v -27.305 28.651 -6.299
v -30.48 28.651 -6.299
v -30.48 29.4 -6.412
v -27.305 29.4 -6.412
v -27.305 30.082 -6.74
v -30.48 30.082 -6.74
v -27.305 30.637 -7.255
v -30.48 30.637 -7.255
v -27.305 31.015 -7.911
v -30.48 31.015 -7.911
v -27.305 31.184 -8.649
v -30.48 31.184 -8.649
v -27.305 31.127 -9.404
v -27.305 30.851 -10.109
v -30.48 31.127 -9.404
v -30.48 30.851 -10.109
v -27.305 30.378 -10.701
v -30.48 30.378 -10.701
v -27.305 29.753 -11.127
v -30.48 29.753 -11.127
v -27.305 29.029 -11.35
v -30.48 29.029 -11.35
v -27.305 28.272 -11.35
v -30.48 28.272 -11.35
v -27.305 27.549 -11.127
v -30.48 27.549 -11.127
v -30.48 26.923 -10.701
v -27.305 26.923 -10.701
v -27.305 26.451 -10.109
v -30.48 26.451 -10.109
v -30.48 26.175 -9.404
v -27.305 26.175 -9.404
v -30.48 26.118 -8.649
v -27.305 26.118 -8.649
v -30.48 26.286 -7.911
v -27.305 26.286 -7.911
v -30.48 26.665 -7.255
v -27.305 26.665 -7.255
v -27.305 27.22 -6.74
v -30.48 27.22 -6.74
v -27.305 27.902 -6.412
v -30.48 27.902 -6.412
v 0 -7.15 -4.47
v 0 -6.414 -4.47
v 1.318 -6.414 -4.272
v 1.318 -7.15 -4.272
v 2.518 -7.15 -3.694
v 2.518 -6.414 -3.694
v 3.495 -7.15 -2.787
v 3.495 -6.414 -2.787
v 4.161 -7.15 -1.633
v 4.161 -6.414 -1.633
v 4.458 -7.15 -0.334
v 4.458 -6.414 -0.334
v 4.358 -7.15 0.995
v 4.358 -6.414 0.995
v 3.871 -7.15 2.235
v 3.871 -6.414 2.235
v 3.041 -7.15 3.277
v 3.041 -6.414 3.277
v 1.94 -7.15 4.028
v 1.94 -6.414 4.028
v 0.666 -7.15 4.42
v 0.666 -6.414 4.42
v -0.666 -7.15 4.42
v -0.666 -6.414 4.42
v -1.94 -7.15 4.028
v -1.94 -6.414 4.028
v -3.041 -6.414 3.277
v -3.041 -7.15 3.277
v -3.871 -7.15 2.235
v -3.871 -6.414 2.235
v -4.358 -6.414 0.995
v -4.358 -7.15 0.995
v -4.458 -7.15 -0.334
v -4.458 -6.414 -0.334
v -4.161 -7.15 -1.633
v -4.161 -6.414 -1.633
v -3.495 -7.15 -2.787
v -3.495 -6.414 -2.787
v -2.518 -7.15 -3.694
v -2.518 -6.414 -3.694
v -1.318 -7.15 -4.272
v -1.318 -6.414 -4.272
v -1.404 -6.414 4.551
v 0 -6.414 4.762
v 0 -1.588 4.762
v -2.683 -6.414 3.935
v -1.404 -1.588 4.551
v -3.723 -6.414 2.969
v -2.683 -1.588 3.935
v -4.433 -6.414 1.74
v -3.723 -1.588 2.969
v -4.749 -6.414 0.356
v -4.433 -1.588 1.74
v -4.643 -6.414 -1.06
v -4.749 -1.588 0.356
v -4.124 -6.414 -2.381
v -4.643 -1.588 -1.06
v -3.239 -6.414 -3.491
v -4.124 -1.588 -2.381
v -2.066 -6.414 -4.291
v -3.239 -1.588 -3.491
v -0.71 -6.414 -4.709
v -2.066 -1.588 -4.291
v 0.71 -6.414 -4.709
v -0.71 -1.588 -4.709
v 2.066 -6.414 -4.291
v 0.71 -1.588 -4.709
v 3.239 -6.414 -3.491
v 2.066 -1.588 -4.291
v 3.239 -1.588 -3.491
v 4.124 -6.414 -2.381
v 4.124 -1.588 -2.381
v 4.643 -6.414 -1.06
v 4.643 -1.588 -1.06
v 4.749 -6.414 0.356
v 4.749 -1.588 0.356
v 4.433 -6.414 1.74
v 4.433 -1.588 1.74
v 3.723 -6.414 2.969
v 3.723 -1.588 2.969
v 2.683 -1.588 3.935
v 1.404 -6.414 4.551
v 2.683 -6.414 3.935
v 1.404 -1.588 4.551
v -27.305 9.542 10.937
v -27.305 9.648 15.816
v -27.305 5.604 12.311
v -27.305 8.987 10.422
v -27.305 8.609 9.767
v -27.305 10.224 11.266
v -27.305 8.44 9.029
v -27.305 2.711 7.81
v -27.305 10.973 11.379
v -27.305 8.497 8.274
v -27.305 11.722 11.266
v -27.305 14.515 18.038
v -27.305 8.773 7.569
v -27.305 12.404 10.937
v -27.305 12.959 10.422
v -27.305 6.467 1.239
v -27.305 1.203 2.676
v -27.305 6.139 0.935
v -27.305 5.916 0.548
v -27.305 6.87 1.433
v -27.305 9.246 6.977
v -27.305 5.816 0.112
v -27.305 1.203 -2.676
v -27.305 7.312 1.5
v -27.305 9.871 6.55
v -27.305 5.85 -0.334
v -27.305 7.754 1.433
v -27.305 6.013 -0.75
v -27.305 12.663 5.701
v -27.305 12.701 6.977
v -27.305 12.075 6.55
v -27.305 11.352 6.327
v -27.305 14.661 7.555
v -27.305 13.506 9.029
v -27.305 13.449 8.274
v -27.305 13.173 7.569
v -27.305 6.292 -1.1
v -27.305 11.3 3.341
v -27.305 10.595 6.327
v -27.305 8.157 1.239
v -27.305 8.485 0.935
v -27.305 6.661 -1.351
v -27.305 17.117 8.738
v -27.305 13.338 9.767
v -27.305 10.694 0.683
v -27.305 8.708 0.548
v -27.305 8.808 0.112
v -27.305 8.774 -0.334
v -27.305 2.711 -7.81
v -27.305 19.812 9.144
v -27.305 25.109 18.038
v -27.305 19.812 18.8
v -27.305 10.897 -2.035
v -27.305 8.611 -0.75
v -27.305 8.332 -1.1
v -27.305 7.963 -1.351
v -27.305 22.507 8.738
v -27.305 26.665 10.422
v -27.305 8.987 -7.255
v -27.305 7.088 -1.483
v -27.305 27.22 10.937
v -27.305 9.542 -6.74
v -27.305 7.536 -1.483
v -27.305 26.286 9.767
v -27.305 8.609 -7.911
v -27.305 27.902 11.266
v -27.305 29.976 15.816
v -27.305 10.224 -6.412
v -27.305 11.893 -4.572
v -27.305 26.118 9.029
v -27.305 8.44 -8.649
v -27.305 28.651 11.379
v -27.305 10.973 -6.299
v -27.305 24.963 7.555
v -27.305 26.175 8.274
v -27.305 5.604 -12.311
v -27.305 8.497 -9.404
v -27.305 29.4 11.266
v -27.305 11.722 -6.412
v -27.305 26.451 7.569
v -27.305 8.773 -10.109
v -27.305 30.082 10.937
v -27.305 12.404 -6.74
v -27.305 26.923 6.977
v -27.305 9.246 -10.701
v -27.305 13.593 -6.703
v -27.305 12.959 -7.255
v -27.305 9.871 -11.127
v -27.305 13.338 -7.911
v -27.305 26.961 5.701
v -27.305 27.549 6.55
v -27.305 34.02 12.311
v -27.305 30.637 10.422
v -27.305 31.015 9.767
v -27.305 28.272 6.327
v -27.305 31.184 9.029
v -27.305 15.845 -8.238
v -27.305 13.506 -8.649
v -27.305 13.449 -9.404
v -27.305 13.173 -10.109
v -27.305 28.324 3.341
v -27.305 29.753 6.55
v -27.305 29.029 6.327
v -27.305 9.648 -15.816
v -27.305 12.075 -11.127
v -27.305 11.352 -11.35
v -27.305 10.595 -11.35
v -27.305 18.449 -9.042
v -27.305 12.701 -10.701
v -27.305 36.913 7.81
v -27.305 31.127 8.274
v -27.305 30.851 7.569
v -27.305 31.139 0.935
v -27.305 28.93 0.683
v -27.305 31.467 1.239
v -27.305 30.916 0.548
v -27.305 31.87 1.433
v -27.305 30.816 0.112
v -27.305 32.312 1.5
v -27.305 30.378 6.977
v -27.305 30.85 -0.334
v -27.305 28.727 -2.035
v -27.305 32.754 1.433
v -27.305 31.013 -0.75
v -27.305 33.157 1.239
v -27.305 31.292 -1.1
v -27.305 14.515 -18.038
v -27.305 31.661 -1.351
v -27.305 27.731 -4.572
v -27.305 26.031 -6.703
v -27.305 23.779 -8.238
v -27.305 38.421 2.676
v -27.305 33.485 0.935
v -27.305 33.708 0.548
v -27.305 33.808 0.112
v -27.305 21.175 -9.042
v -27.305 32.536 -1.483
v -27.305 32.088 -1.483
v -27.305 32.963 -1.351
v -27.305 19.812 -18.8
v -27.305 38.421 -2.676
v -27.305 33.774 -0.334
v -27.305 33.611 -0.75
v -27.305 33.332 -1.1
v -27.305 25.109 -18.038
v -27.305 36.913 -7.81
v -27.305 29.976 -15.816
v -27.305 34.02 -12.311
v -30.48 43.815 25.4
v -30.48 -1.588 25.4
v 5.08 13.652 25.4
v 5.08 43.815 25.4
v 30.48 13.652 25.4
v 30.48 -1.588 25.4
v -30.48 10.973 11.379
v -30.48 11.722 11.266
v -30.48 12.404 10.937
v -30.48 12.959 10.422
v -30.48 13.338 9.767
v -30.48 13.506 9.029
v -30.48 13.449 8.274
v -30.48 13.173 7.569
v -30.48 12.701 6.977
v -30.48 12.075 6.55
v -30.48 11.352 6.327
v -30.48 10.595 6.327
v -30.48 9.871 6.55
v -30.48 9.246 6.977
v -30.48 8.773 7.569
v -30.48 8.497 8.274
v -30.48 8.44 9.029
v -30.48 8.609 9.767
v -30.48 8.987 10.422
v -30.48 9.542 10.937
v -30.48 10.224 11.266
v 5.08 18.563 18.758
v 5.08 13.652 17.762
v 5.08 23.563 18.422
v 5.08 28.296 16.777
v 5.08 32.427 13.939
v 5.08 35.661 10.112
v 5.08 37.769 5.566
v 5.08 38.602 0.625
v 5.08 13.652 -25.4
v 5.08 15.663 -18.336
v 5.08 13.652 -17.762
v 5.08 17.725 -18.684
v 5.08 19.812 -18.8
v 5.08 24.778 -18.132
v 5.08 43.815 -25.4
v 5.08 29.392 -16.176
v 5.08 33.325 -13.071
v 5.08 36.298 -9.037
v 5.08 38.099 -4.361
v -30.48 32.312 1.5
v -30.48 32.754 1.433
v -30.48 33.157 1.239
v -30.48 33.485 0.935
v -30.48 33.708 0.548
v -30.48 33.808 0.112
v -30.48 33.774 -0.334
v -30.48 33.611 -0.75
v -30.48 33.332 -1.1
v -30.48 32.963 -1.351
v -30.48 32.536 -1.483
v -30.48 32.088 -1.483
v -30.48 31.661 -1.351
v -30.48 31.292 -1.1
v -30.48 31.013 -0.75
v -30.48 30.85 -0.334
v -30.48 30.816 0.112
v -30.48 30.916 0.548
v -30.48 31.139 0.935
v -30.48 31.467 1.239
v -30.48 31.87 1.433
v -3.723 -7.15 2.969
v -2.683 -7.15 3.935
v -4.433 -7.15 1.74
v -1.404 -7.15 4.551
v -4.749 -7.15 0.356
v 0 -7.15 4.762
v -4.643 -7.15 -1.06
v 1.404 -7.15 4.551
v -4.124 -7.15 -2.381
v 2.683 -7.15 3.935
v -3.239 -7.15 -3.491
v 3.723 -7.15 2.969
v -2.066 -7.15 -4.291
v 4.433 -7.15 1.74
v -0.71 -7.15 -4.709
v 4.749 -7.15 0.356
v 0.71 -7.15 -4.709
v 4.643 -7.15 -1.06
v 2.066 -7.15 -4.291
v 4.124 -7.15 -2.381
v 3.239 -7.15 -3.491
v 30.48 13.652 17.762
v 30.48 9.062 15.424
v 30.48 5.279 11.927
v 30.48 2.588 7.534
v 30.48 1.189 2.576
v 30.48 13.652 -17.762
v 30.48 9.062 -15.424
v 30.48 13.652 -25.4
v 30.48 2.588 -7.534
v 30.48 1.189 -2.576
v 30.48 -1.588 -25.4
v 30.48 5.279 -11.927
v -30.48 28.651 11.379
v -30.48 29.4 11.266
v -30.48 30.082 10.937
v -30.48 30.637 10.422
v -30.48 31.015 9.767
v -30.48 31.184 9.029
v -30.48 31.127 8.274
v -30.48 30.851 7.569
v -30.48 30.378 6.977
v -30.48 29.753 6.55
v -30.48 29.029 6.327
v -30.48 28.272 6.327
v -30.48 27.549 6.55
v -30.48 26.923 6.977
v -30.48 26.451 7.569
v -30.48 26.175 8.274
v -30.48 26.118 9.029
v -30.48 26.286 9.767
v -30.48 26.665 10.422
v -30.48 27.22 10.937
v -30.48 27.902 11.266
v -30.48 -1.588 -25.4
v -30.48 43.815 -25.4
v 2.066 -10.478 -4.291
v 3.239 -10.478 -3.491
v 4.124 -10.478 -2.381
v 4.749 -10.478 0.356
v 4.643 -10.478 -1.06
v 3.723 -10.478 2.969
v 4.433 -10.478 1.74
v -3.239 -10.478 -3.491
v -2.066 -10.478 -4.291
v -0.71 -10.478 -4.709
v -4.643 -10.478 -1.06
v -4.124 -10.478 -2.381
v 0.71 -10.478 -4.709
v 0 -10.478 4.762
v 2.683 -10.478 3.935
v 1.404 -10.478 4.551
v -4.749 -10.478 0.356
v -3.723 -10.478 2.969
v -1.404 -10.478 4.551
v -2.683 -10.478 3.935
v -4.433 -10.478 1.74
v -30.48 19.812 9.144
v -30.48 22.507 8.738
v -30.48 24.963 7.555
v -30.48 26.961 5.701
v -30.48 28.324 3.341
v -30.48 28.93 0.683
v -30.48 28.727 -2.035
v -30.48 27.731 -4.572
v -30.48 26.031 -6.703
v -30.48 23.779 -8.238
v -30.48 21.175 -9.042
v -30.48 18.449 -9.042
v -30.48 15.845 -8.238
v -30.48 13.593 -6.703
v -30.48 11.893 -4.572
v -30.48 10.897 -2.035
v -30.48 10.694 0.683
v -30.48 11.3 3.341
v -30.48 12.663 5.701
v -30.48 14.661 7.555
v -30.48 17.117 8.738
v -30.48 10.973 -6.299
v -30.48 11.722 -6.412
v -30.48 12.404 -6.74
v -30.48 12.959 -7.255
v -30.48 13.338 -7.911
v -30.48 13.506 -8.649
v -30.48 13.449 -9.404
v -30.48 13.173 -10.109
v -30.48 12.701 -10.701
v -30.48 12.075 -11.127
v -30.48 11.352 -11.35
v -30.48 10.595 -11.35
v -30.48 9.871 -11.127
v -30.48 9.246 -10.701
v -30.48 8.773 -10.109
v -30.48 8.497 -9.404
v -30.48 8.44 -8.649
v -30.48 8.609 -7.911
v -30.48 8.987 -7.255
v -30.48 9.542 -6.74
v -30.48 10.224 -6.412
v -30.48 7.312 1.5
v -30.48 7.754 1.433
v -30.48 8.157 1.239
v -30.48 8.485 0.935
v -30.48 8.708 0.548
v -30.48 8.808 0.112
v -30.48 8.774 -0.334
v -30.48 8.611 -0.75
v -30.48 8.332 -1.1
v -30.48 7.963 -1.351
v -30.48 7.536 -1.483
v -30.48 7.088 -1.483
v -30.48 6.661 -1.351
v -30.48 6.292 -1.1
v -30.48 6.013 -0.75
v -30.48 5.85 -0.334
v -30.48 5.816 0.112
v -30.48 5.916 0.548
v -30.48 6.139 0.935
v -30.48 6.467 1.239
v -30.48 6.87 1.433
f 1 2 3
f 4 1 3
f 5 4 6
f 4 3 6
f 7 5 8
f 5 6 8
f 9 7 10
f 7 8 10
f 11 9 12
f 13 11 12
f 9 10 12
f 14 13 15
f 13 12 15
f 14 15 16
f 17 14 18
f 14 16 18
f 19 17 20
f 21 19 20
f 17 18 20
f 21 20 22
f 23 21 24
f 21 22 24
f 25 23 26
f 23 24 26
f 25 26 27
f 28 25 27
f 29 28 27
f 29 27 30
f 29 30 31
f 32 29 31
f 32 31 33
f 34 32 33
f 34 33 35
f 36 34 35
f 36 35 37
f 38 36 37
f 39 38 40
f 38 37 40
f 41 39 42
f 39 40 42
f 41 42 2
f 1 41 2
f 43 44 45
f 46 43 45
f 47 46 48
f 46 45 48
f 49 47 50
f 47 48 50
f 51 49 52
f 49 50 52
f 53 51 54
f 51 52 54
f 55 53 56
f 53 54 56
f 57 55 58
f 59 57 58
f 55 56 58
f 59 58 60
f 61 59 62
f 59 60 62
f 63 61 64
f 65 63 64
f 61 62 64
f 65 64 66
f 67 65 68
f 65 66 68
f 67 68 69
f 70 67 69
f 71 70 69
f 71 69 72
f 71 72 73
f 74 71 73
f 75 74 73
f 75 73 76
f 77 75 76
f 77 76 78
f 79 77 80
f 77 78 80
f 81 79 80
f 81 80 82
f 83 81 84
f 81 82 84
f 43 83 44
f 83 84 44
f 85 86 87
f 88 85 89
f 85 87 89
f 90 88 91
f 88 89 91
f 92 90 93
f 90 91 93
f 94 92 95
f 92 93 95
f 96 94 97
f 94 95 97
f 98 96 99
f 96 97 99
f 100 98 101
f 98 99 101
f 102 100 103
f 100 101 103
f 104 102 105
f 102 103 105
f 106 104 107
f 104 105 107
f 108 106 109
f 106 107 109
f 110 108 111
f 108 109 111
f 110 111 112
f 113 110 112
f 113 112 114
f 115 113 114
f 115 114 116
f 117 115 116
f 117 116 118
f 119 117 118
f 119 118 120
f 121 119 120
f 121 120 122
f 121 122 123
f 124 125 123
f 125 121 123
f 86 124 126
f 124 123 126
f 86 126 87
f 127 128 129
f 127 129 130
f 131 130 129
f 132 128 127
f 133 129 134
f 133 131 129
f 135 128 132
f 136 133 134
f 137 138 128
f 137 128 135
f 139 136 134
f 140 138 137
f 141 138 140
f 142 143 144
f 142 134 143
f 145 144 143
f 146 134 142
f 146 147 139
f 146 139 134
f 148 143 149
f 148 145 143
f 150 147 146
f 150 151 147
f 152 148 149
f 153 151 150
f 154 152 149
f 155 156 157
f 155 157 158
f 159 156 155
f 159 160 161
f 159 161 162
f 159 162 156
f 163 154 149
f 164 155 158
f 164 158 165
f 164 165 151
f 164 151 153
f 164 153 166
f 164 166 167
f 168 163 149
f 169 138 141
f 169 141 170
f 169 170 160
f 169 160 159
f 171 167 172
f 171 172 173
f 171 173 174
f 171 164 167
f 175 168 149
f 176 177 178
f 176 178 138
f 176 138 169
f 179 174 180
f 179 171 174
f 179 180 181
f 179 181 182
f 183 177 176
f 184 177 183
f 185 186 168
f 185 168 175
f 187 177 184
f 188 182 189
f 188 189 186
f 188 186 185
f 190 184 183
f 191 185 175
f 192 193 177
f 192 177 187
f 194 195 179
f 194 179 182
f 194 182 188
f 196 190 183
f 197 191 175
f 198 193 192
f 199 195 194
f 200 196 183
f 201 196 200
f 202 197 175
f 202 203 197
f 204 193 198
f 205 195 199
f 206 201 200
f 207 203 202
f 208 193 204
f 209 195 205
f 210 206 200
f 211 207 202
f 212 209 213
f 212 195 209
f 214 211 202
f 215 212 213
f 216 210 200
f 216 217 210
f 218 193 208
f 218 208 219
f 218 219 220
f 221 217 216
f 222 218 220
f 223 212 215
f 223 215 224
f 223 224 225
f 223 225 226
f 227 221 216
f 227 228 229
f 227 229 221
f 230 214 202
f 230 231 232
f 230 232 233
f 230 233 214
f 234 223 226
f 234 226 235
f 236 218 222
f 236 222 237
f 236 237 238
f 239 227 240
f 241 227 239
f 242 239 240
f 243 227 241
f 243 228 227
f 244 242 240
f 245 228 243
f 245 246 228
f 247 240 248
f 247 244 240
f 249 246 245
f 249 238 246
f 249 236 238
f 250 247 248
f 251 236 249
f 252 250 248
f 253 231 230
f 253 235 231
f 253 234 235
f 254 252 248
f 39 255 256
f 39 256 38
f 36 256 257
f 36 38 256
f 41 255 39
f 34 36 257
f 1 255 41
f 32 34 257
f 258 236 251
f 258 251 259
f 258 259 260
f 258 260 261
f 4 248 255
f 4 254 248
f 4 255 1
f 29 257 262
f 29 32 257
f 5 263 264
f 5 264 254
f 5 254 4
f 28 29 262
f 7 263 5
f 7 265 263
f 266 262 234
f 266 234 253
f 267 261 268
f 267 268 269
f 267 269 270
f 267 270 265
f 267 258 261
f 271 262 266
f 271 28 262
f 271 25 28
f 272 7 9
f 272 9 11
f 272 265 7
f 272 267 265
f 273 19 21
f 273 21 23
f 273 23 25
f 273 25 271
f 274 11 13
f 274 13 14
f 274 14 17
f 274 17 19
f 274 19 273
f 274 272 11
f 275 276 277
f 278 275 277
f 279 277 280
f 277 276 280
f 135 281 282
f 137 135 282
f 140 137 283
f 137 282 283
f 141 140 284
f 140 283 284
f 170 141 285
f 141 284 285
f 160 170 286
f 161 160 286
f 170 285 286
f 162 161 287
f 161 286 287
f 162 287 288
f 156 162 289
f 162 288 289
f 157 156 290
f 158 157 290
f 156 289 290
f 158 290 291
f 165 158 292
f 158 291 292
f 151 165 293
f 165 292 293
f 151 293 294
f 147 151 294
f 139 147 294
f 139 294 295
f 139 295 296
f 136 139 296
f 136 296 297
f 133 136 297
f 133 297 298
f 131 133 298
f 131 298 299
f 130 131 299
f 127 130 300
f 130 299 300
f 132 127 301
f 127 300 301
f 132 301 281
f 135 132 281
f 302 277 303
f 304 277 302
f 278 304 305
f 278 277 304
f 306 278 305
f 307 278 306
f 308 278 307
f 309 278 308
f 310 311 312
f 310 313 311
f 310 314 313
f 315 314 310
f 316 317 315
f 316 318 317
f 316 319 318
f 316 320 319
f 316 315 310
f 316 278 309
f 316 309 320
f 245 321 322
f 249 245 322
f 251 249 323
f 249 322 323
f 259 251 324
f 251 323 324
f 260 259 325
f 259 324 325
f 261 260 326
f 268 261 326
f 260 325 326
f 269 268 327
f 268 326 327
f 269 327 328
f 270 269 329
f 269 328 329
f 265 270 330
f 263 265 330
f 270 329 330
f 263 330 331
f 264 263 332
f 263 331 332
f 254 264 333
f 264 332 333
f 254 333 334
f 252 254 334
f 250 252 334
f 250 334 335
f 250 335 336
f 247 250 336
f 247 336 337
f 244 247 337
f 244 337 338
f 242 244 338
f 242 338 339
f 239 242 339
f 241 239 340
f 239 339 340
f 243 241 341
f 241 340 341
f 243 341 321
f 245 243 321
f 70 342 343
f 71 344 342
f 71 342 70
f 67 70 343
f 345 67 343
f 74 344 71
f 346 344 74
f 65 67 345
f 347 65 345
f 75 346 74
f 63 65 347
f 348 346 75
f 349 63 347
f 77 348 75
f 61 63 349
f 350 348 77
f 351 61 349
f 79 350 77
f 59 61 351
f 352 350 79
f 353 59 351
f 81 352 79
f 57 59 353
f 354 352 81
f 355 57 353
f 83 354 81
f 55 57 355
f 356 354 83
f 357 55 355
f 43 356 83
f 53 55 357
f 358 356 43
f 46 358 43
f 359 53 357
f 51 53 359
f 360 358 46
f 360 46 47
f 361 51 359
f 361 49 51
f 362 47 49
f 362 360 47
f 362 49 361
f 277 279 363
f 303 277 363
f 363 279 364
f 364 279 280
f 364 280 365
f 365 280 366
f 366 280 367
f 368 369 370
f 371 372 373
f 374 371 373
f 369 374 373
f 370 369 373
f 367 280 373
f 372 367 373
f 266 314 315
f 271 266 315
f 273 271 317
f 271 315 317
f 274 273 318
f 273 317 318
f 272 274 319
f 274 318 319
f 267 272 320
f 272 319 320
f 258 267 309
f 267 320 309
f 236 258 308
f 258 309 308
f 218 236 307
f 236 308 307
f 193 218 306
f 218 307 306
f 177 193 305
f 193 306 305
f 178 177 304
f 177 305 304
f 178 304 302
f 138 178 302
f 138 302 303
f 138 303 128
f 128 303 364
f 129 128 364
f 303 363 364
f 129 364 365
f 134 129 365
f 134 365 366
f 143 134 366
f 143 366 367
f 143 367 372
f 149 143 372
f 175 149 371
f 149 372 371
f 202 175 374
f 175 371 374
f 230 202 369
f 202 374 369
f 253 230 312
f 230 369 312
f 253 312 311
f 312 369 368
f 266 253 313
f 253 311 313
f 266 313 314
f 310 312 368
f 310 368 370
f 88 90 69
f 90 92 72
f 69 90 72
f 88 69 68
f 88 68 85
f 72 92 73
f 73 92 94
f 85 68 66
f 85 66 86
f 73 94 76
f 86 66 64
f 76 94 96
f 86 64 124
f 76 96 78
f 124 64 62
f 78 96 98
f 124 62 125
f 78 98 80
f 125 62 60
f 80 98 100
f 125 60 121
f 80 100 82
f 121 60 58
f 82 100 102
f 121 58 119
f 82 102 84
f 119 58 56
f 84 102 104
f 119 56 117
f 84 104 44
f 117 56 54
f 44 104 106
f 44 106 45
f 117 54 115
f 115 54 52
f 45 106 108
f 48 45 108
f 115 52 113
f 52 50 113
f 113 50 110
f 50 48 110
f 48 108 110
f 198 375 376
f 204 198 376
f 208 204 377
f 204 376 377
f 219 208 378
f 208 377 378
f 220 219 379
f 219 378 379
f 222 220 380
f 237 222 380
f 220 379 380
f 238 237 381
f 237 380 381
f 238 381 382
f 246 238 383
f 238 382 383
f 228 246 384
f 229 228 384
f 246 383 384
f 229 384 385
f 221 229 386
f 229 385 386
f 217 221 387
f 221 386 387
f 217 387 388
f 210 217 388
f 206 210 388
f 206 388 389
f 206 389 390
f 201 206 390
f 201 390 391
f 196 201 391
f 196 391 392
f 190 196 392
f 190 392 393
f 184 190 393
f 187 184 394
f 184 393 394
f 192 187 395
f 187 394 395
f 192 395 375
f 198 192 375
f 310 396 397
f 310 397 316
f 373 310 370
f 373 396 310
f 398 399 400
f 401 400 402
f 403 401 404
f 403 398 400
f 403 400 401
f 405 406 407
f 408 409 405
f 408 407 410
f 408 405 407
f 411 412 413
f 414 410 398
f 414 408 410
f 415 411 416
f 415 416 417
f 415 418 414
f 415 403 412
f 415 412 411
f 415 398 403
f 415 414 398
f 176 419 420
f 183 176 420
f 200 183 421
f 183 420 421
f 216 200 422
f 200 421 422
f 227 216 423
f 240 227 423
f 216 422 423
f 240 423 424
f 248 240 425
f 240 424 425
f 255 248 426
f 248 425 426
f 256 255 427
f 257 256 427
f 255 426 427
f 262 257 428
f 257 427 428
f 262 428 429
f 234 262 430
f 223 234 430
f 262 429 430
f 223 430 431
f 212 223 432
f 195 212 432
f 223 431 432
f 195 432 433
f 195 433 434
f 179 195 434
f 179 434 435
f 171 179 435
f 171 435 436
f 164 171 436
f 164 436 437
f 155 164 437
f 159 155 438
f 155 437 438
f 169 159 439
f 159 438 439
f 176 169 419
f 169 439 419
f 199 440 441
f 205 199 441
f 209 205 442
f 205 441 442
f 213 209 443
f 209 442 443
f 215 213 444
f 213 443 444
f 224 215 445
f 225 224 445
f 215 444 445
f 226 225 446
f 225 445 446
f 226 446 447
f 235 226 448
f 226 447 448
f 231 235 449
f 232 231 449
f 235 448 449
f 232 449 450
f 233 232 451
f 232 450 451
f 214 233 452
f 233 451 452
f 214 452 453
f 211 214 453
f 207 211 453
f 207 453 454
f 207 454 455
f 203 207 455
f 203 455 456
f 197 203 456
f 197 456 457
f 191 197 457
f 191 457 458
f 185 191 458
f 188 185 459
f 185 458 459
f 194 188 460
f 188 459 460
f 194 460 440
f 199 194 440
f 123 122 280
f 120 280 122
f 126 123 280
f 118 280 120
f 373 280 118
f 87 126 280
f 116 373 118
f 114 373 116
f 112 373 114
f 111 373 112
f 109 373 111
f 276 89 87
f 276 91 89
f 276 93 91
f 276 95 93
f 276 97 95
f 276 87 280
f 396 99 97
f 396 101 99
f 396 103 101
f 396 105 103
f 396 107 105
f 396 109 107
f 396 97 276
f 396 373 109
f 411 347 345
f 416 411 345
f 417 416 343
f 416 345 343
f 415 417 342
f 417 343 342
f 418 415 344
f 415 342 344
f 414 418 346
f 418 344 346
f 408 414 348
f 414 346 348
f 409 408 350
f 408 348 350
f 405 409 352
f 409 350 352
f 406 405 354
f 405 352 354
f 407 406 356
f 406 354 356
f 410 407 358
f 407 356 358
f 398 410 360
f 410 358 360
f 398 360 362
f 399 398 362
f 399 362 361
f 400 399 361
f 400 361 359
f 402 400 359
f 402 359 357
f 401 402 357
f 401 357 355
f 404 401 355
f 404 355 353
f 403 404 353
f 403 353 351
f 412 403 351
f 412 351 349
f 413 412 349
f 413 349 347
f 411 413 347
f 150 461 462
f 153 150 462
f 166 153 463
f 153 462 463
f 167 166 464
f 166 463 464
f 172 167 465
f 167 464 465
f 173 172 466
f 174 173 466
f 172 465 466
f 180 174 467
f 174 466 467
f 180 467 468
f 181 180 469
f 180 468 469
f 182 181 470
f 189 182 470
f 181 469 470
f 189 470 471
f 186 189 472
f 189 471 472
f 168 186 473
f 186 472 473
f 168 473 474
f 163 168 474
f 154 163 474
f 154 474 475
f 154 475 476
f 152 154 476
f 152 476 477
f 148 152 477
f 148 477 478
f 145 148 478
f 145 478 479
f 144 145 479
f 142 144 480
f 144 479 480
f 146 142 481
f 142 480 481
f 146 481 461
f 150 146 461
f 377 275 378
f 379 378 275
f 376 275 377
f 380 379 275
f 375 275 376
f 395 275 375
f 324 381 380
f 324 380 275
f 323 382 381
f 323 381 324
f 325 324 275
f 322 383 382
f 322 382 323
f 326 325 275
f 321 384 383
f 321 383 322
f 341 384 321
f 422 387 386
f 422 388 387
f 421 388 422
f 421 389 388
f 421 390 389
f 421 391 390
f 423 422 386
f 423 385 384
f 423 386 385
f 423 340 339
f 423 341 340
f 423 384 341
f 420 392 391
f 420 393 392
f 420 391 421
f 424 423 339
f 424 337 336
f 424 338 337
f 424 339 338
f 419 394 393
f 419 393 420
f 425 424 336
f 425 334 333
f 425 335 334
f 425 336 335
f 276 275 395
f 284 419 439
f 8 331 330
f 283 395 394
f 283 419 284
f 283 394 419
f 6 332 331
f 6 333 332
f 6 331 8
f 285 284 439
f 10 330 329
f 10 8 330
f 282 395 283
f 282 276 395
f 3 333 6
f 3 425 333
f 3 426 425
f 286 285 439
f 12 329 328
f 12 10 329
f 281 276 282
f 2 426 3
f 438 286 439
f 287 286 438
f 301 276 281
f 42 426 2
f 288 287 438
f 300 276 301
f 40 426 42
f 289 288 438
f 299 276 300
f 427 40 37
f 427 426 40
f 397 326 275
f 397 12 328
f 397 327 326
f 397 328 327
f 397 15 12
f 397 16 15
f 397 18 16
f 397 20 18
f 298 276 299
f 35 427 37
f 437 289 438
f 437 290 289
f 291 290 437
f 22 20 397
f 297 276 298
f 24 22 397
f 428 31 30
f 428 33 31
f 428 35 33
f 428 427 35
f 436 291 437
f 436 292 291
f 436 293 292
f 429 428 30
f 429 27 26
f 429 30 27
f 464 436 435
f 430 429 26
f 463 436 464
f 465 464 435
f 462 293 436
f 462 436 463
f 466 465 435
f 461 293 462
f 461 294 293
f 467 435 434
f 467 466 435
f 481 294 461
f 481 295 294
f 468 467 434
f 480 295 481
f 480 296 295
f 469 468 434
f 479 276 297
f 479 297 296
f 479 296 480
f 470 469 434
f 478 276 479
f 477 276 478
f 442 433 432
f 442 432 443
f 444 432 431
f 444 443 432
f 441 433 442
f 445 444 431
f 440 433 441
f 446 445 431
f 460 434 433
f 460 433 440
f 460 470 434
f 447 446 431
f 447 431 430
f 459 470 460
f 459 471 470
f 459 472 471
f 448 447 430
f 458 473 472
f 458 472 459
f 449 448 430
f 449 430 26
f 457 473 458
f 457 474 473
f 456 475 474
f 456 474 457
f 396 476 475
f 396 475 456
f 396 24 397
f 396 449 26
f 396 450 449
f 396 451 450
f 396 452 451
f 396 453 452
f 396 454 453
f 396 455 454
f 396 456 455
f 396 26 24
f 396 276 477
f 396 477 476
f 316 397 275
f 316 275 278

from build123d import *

# Parameters (mm, degrees)
SKETCH1_W              = 60.96
SKETCH1_H              = 50.8
BOSS_EXTRUDE1_DEPTH    = 40.64
SKETCH3_W              = 60.96
SKETCH3_H              = 50.8
BOSS_EXTRUDE2_DEPTH    = 1.5875
SKETCH2_R              = 18.8
CUT_EXTRUDE1_DEPTH     = 57.785
SKETCH4_W              = 60.96
SKETCH4_H              = 50.8
BOSS_EXTRUDE3_DEPTH    = 3.175
SKETCH6_R              = 9.144
CUT_EXTRUDE2_DEPTH     = 3.175
SKETCH7_R              = 1.5
CUT_EXTRUDE3_DEPTH     = 3.175
SKETCH8_R              = 4.7625
BOSS_EXTRUDE4_DEPTH    = 8.89
CUT_EXTRUDE4_START     = -7.1501
CUT_EXTRUDE4_OUTLINE_R = 4.7625
CUT_EXTRUDE4_DEPTH     = 0.7366
SKETCH9_R              = 4.4704
BOSS_EXTRUDE5_DEPTH    = 0.7366
SKETCH13_R             = 2.54
CUT_EXTRUDE6_DEPTH     = 3.175
SKETCH14_W             = 50.8
SKETCH14_H             = 30.1625
CUT_EXTRUDE7_DEPTH     = 25.4


# Read off the part's stored shape, not the designer's step: Cut-Extrude4
with BuildPart() as part:
    # Sketch1 → Boss-Extrude1 (new body)
    with BuildSketch(Plane(origin=(0, 0, 0), x_dir=(1, 0, 0), z_dir=(0, 1, 0))):
        Rectangle(SKETCH1_W, SKETCH1_H)
    extrude(amount=BOSS_EXTRUDE1_DEPTH)

    # Sketch3 → Boss-Extrude2 (add)
    with BuildSketch(Plane(origin=(0, 0, 0), x_dir=(-1, 0, 0), z_dir=(0, -1, 0))):
        Rectangle(SKETCH3_W, SKETCH3_H)
    extrude(amount=BOSS_EXTRUDE2_DEPTH)

    # Sketch2 → Cut-Extrude1 (cut)
    with BuildSketch(Plane(origin=(30.48, 0, 0), x_dir=(0, 0, -1), z_dir=(1, 0, 0))):
        with Locations((0, 19.812)):
            Circle(SKETCH2_R)
    extrude(amount=-CUT_EXTRUDE1_DEPTH, mode=Mode.SUBTRACT)

    # Sketch4 → Boss-Extrude3 (add)
    with BuildSketch(Plane(origin=(0, 40.64, 0), x_dir=(1, 0, 0), z_dir=(0, 1, 0))):
        Rectangle(SKETCH4_W, SKETCH4_H)
    extrude(amount=BOSS_EXTRUDE3_DEPTH)

    # Sketch6 → Cut-Extrude2 (cut)
    with BuildSketch(Plane.ZY.offset(30.48)):
        with Locations((0, 19.812)):
            Circle(SKETCH6_R)
    extrude(amount=-CUT_EXTRUDE2_DEPTH, mode=Mode.SUBTRACT)

    # Sketch7 → Cut-Extrude3 (cut)
    with BuildSketch(Plane.ZY.offset(30.48)):
        with Locations((0, 32.312000019)):
            Circle(SKETCH7_R)
        with Locations((0, 7.311999981)):
            Circle(SKETCH7_R)
    extrude(amount=-CUT_EXTRUDE3_DEPTH, mode=Mode.SUBTRACT)

    # Sketch8 → Boss-Extrude4 (add)
    with BuildSketch(Plane.XZ.offset(1.5875)):
        with Locations(Location((0, 0, 0), (0, 0, 90))):
            Circle(SKETCH8_R)
    extrude(amount=BOSS_EXTRUDE4_DEPTH)

    # Cut-Extrude4 outline → Cut-Extrude4 (cut)
    with BuildSketch(Plane(origin=(0, 0, 0), x_dir=(1, 0, 0), z_dir=(0, 1, 0)).offset(CUT_EXTRUDE4_START)):
        Circle(CUT_EXTRUDE4_OUTLINE_R)
    extrude(amount=CUT_EXTRUDE4_DEPTH, mode=Mode.SUBTRACT)

    # Sketch9 → Boss-Extrude5 (add)
    with BuildSketch(Plane(origin=(0, -6.4135, 0), x_dir=(-1, 0, 0), z_dir=(0, -1, 0))):
        with Locations(Location((0, 0, 0), (0, 0, 90))):
            Circle(SKETCH9_R)
    extrude(amount=BOSS_EXTRUDE5_DEPTH)

    # Sketch13 → Cut-Extrude6 (cut)
    with BuildSketch(Plane.ZY.offset(30.48)):
        with Locations((8.838834778, 28.650834778)):
            Circle(SKETCH13_R)
        with Locations((-8.838834778, 28.650834778)):
            Circle(SKETCH13_R)
        with Locations((-8.838834778, 10.973165222)):
            Circle(SKETCH13_R)
        with Locations((8.838834778, 10.973165222)):
            Circle(SKETCH13_R)
    extrude(amount=-CUT_EXTRUDE6_DEPTH, mode=Mode.SUBTRACT)

    # Sketch14 → Cut-Extrude7 (cut)
    with BuildSketch(Plane(origin=(30.48, 0, 0), x_dir=(0, 0, -1), z_dir=(1, 0, 0))):
        with Locations((0, 28.73375)):
            Rectangle(SKETCH14_W, SKETCH14_H)
    extrude(amount=-CUT_EXTRUDE7_DEPTH, mode=Mode.SUBTRACT)


solid = part.part
